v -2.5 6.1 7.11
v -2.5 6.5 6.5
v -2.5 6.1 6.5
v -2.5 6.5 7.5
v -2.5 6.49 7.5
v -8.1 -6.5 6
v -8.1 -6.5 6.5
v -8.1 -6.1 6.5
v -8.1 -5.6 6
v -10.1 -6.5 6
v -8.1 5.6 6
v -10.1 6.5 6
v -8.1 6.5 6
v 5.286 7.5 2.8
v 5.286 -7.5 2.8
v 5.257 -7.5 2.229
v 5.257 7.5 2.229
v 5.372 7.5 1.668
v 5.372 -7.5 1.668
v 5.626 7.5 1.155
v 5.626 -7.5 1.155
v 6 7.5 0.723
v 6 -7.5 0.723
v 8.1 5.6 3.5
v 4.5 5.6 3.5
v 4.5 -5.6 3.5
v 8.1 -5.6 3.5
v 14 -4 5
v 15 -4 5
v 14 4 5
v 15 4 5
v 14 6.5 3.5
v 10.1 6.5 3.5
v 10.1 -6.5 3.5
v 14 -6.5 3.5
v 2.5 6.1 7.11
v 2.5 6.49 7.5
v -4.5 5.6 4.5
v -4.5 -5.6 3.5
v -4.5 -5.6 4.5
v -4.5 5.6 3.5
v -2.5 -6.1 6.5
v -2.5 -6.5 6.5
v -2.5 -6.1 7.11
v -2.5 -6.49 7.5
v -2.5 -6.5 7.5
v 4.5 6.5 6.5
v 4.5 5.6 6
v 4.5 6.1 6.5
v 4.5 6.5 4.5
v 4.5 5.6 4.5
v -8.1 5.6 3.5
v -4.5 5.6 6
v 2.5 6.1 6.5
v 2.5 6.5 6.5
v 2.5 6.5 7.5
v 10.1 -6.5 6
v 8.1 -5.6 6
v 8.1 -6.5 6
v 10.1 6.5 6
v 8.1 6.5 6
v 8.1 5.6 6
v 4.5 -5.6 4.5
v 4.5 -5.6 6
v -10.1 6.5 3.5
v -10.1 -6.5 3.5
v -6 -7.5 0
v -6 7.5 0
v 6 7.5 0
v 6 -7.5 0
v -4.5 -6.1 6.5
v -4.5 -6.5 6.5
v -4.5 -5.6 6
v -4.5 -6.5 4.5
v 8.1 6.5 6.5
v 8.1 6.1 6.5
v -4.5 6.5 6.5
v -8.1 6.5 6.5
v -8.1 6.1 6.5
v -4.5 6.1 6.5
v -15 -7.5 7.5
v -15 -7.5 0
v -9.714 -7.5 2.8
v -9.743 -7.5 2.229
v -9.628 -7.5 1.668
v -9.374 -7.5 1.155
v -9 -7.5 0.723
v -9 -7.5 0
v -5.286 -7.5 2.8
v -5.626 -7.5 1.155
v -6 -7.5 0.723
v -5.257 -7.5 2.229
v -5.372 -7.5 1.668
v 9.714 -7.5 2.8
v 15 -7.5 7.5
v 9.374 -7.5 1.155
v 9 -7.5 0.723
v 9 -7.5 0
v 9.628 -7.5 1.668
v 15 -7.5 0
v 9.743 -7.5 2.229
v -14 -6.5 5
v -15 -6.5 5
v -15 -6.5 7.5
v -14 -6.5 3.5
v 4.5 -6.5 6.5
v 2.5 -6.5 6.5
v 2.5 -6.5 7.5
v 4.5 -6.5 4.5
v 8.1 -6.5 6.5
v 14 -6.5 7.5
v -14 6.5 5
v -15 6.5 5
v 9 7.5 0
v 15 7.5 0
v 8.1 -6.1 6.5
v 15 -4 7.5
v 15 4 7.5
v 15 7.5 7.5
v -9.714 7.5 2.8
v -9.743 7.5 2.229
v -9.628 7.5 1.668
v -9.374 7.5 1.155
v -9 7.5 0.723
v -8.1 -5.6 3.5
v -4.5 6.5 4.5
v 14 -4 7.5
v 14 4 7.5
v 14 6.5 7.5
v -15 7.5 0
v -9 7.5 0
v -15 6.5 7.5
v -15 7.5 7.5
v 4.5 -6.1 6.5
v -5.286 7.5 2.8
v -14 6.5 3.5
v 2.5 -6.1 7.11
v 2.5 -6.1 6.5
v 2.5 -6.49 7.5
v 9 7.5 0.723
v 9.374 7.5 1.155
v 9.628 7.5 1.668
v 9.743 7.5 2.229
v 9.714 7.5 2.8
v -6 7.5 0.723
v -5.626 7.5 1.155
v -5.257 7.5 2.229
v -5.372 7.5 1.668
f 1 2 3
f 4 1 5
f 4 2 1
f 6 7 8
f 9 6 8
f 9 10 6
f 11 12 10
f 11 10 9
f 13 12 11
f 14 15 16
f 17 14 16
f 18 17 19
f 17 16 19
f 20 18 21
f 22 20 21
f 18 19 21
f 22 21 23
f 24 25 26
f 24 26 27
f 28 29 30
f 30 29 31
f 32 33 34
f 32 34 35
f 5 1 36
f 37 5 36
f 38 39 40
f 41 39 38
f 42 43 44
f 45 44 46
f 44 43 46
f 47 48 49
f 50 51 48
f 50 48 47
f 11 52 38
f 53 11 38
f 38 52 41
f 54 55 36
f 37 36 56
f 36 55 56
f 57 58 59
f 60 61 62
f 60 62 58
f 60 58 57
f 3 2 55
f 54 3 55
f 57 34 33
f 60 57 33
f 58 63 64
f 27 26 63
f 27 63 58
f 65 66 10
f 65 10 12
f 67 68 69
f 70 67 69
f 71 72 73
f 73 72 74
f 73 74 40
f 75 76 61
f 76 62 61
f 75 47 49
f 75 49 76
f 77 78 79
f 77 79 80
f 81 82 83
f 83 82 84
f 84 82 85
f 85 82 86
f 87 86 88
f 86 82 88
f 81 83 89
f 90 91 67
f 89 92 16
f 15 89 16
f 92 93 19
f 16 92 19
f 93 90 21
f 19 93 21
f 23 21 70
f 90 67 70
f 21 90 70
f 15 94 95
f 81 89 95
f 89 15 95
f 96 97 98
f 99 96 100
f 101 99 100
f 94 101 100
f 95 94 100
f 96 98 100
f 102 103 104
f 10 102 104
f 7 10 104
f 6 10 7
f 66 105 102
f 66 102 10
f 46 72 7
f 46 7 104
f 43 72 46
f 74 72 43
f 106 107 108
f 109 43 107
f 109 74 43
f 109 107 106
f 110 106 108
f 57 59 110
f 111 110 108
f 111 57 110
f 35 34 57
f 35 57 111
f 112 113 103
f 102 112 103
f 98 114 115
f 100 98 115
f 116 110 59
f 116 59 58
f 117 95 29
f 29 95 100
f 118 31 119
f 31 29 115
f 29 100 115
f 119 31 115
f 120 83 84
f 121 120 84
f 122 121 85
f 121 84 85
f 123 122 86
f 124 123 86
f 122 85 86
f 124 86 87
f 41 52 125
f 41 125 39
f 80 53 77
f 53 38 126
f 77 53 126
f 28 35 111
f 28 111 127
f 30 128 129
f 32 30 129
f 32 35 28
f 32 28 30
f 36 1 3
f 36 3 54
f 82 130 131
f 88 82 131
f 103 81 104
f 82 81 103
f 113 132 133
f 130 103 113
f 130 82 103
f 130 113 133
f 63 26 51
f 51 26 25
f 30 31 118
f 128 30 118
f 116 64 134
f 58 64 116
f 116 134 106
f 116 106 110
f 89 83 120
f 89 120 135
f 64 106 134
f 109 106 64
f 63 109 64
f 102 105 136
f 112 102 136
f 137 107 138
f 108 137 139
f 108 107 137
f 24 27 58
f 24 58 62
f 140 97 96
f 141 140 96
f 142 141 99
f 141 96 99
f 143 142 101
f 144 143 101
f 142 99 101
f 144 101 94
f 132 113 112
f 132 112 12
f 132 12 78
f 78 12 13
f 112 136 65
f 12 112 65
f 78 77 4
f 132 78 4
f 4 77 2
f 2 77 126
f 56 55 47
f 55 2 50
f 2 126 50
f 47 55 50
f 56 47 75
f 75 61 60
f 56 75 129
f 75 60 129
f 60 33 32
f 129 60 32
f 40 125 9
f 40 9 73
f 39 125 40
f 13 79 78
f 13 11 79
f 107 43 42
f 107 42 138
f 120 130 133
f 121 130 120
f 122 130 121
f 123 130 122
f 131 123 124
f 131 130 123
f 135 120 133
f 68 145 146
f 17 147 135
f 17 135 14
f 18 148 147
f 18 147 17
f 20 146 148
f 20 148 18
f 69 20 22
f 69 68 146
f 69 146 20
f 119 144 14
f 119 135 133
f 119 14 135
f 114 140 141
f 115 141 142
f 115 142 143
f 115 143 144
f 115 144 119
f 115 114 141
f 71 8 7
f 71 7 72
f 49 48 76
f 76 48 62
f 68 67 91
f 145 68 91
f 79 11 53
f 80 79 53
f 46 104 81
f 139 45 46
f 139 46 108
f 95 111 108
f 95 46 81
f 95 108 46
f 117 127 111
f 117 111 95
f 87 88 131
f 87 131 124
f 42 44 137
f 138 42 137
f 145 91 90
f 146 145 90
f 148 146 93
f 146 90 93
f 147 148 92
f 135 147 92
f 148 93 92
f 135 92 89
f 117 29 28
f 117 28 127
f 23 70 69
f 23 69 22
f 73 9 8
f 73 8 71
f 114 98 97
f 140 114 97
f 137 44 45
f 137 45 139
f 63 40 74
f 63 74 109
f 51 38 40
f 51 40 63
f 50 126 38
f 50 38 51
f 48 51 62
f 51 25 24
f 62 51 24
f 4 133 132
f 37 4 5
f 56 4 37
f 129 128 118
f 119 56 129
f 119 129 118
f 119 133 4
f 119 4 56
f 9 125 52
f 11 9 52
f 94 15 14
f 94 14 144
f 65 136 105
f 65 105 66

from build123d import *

# Parameters (mm, degrees)
SKETCH_W            = 30
SKETCH_H            = 15
PAD_DEPTH           = 3.5
POCKET_DEPTH        = 15.001
LINEARPATTERN_COUNT = 2
LINEARPATTERN_PITCH = 15
SKETCH002_W         = 30
SKETCH002_H         = 15
SKETCH002_W_2       = 28
SKETCH002_H_2       = 13
PAD001_DEPTH        = 4
SKETCH003_W         = 9
SKETCH003_H         = 13
PAD002_DEPTH        = 1
SKETCH004_W         = 2
SKETCH004_H         = 13
PAD003_DEPTH        = 2.5
SKETCH005_W         = 3.6
SKETCH005_H         = 0.9
PAD004_DEPTH        = 3
CHAMFER_SIZE        = 0.5
SKETCH006_W         = 13
SKETCH006_H         = 2.5
POCKET001_DEPTH     = 1
SKETCH007_W         = 8
SKETCH007_H         = 2.5
POCKET002_DEPTH     = 1
SKETCH008_W         = 5
SKETCH008_H         = 1
PAD005_DEPTH        = 0.4
CHAMFER001_SIZE     = 0.39


with BuildPart() as part:
    # Sketch → Pad (new body)
    with BuildSketch(Plane.XY):
        Rectangle(SKETCH_W, SKETCH_H)
    extrude(amount=PAD_DEPTH)

    # Sketch001 (on Face3 of Pad) → Pocket (cut, through all)
    with BuildSketch(Plane.XZ.offset(7.5)):
        with BuildLine():
            Line((-9, 0), (-9, 0.722949))
            ThreePointArc((-9.714159, 2.8), (-9.62774, 1.668412), (-9, 0.722949))
            Line((-9.714159, 2.8), (-5.285841, 2.8))
            ThreePointArc((-6, 0.722949), (-5.37226, 1.668412), (-5.285841, 2.8))
            Line((-6, 0), (-6, 0.722949))
            Line((-9, 0), (-6, 0))
        make_face()
    pocket = extrude(amount=-POCKET_DEPTH, mode=Mode.SUBTRACT)

    # LinearPattern: Pocket ×2
    with Locations(*[(i * LINEARPATTERN_PITCH, 0, 0) for i in range(1, LINEARPATTERN_COUNT)]):
        add(pocket, mode=Mode.SUBTRACT)

    # Sketch002 (on Face16 of LinearPattern) → Pad001 (join)
    with BuildSketch(Plane.XY.offset(3.5)):
        Rectangle(SKETCH002_W, SKETCH002_H)
        Rectangle(SKETCH002_W_2, SKETCH002_H_2, mode=Mode.SUBTRACT)
    extrude(amount=PAD001_DEPTH)

    # Sketch003 (on Face27 of Pad001) → Pad002 (join)
    with BuildSketch(Plane.XY.offset(3.5)):
        Rectangle(SKETCH003_W, SKETCH003_H)
    extrude(amount=PAD002_DEPTH)

    # Sketch004 (on Face27 of Pad002) → Pad003 (join)
    with BuildSketch(Plane.XY.offset(3.5)):
        with Locations((-9.1, 0)):
            Rectangle(SKETCH004_W, SKETCH004_H)
        with Locations((9.1, 0)):
            Rectangle(SKETCH004_W, SKETCH004_H)
    extrude(amount=PAD003_DEPTH)

    # Sketch005 (on Face27 of Pad003) → Pad004 (join)
    with BuildSketch(Plane.XY.offset(3.5)):
        with Locations((-6.3, 6.05)):
            Rectangle(SKETCH005_W, SKETCH005_H)
        with Locations((6.3, 6.05)):
            Rectangle(SKETCH005_W, SKETCH005_H)
        with Locations((-6.3, -6.05)):
            Rectangle(SKETCH005_W, SKETCH005_H)
        with Locations((6.3, -6.05)):
            Rectangle(SKETCH005_W, SKETCH005_H)
    extrude(amount=PAD004_DEPTH)

    # Chamfer
    chamfer_edges = [part.edges().sort_by_distance(p)[0] for p in [
        (-6.3, 5.6, 6.5),
        (6.3, 5.6, 6.5),
        (-6.3, -5.6, 6.5),
        (6.3, -5.6, 6.5),
    ]]
    chamfer(chamfer_edges, length=CHAMFER_SIZE)

    # Sketch006 (on Face35 of Chamfer) → Pocket001 (cut)
    with BuildSketch(Plane(origin=(-15, 0, 0), x_dir=(0, -1, 0), z_dir=(-1, 0, 0))):
        with Locations((0, 6.25)):
            Rectangle(SKETCH006_W, SKETCH006_H)
    extrude(amount=-POCKET001_DEPTH, mode=Mode.SUBTRACT)

    # Sketch007 (on Face29 of Pocket001) → Pocket002 (cut)
    with BuildSketch(Plane.YZ.offset(15)):
        with Locations((0, 6.25)):
            Rectangle(SKETCH007_W, SKETCH007_H)
    extrude(amount=-POCKET002_DEPTH, mode=Mode.SUBTRACT)

    # Sketch008 (on Face21 of Pocket002) → Pad005 (join)
    with BuildSketch(Plane.XZ.offset(-6.5)):
        with Locations((0, 7)):
            Rectangle(SKETCH008_W, SKETCH008_H)
    pad005 = extrude(amount=PAD005_DEPTH)

    # Mirrored: Pad005 across XZ
    add(pad005.mirror(Plane.XZ))

    # Chamfer001
    chamfer001_edges = [part.edges().sort_by_distance(p)[0] for p in [
        (0, -6.1, 7.5),
        (0, 6.1, 7.5),
    ]]
    chamfer(chamfer001_edges, length=CHAMFER001_SIZE)


solid = part.part
